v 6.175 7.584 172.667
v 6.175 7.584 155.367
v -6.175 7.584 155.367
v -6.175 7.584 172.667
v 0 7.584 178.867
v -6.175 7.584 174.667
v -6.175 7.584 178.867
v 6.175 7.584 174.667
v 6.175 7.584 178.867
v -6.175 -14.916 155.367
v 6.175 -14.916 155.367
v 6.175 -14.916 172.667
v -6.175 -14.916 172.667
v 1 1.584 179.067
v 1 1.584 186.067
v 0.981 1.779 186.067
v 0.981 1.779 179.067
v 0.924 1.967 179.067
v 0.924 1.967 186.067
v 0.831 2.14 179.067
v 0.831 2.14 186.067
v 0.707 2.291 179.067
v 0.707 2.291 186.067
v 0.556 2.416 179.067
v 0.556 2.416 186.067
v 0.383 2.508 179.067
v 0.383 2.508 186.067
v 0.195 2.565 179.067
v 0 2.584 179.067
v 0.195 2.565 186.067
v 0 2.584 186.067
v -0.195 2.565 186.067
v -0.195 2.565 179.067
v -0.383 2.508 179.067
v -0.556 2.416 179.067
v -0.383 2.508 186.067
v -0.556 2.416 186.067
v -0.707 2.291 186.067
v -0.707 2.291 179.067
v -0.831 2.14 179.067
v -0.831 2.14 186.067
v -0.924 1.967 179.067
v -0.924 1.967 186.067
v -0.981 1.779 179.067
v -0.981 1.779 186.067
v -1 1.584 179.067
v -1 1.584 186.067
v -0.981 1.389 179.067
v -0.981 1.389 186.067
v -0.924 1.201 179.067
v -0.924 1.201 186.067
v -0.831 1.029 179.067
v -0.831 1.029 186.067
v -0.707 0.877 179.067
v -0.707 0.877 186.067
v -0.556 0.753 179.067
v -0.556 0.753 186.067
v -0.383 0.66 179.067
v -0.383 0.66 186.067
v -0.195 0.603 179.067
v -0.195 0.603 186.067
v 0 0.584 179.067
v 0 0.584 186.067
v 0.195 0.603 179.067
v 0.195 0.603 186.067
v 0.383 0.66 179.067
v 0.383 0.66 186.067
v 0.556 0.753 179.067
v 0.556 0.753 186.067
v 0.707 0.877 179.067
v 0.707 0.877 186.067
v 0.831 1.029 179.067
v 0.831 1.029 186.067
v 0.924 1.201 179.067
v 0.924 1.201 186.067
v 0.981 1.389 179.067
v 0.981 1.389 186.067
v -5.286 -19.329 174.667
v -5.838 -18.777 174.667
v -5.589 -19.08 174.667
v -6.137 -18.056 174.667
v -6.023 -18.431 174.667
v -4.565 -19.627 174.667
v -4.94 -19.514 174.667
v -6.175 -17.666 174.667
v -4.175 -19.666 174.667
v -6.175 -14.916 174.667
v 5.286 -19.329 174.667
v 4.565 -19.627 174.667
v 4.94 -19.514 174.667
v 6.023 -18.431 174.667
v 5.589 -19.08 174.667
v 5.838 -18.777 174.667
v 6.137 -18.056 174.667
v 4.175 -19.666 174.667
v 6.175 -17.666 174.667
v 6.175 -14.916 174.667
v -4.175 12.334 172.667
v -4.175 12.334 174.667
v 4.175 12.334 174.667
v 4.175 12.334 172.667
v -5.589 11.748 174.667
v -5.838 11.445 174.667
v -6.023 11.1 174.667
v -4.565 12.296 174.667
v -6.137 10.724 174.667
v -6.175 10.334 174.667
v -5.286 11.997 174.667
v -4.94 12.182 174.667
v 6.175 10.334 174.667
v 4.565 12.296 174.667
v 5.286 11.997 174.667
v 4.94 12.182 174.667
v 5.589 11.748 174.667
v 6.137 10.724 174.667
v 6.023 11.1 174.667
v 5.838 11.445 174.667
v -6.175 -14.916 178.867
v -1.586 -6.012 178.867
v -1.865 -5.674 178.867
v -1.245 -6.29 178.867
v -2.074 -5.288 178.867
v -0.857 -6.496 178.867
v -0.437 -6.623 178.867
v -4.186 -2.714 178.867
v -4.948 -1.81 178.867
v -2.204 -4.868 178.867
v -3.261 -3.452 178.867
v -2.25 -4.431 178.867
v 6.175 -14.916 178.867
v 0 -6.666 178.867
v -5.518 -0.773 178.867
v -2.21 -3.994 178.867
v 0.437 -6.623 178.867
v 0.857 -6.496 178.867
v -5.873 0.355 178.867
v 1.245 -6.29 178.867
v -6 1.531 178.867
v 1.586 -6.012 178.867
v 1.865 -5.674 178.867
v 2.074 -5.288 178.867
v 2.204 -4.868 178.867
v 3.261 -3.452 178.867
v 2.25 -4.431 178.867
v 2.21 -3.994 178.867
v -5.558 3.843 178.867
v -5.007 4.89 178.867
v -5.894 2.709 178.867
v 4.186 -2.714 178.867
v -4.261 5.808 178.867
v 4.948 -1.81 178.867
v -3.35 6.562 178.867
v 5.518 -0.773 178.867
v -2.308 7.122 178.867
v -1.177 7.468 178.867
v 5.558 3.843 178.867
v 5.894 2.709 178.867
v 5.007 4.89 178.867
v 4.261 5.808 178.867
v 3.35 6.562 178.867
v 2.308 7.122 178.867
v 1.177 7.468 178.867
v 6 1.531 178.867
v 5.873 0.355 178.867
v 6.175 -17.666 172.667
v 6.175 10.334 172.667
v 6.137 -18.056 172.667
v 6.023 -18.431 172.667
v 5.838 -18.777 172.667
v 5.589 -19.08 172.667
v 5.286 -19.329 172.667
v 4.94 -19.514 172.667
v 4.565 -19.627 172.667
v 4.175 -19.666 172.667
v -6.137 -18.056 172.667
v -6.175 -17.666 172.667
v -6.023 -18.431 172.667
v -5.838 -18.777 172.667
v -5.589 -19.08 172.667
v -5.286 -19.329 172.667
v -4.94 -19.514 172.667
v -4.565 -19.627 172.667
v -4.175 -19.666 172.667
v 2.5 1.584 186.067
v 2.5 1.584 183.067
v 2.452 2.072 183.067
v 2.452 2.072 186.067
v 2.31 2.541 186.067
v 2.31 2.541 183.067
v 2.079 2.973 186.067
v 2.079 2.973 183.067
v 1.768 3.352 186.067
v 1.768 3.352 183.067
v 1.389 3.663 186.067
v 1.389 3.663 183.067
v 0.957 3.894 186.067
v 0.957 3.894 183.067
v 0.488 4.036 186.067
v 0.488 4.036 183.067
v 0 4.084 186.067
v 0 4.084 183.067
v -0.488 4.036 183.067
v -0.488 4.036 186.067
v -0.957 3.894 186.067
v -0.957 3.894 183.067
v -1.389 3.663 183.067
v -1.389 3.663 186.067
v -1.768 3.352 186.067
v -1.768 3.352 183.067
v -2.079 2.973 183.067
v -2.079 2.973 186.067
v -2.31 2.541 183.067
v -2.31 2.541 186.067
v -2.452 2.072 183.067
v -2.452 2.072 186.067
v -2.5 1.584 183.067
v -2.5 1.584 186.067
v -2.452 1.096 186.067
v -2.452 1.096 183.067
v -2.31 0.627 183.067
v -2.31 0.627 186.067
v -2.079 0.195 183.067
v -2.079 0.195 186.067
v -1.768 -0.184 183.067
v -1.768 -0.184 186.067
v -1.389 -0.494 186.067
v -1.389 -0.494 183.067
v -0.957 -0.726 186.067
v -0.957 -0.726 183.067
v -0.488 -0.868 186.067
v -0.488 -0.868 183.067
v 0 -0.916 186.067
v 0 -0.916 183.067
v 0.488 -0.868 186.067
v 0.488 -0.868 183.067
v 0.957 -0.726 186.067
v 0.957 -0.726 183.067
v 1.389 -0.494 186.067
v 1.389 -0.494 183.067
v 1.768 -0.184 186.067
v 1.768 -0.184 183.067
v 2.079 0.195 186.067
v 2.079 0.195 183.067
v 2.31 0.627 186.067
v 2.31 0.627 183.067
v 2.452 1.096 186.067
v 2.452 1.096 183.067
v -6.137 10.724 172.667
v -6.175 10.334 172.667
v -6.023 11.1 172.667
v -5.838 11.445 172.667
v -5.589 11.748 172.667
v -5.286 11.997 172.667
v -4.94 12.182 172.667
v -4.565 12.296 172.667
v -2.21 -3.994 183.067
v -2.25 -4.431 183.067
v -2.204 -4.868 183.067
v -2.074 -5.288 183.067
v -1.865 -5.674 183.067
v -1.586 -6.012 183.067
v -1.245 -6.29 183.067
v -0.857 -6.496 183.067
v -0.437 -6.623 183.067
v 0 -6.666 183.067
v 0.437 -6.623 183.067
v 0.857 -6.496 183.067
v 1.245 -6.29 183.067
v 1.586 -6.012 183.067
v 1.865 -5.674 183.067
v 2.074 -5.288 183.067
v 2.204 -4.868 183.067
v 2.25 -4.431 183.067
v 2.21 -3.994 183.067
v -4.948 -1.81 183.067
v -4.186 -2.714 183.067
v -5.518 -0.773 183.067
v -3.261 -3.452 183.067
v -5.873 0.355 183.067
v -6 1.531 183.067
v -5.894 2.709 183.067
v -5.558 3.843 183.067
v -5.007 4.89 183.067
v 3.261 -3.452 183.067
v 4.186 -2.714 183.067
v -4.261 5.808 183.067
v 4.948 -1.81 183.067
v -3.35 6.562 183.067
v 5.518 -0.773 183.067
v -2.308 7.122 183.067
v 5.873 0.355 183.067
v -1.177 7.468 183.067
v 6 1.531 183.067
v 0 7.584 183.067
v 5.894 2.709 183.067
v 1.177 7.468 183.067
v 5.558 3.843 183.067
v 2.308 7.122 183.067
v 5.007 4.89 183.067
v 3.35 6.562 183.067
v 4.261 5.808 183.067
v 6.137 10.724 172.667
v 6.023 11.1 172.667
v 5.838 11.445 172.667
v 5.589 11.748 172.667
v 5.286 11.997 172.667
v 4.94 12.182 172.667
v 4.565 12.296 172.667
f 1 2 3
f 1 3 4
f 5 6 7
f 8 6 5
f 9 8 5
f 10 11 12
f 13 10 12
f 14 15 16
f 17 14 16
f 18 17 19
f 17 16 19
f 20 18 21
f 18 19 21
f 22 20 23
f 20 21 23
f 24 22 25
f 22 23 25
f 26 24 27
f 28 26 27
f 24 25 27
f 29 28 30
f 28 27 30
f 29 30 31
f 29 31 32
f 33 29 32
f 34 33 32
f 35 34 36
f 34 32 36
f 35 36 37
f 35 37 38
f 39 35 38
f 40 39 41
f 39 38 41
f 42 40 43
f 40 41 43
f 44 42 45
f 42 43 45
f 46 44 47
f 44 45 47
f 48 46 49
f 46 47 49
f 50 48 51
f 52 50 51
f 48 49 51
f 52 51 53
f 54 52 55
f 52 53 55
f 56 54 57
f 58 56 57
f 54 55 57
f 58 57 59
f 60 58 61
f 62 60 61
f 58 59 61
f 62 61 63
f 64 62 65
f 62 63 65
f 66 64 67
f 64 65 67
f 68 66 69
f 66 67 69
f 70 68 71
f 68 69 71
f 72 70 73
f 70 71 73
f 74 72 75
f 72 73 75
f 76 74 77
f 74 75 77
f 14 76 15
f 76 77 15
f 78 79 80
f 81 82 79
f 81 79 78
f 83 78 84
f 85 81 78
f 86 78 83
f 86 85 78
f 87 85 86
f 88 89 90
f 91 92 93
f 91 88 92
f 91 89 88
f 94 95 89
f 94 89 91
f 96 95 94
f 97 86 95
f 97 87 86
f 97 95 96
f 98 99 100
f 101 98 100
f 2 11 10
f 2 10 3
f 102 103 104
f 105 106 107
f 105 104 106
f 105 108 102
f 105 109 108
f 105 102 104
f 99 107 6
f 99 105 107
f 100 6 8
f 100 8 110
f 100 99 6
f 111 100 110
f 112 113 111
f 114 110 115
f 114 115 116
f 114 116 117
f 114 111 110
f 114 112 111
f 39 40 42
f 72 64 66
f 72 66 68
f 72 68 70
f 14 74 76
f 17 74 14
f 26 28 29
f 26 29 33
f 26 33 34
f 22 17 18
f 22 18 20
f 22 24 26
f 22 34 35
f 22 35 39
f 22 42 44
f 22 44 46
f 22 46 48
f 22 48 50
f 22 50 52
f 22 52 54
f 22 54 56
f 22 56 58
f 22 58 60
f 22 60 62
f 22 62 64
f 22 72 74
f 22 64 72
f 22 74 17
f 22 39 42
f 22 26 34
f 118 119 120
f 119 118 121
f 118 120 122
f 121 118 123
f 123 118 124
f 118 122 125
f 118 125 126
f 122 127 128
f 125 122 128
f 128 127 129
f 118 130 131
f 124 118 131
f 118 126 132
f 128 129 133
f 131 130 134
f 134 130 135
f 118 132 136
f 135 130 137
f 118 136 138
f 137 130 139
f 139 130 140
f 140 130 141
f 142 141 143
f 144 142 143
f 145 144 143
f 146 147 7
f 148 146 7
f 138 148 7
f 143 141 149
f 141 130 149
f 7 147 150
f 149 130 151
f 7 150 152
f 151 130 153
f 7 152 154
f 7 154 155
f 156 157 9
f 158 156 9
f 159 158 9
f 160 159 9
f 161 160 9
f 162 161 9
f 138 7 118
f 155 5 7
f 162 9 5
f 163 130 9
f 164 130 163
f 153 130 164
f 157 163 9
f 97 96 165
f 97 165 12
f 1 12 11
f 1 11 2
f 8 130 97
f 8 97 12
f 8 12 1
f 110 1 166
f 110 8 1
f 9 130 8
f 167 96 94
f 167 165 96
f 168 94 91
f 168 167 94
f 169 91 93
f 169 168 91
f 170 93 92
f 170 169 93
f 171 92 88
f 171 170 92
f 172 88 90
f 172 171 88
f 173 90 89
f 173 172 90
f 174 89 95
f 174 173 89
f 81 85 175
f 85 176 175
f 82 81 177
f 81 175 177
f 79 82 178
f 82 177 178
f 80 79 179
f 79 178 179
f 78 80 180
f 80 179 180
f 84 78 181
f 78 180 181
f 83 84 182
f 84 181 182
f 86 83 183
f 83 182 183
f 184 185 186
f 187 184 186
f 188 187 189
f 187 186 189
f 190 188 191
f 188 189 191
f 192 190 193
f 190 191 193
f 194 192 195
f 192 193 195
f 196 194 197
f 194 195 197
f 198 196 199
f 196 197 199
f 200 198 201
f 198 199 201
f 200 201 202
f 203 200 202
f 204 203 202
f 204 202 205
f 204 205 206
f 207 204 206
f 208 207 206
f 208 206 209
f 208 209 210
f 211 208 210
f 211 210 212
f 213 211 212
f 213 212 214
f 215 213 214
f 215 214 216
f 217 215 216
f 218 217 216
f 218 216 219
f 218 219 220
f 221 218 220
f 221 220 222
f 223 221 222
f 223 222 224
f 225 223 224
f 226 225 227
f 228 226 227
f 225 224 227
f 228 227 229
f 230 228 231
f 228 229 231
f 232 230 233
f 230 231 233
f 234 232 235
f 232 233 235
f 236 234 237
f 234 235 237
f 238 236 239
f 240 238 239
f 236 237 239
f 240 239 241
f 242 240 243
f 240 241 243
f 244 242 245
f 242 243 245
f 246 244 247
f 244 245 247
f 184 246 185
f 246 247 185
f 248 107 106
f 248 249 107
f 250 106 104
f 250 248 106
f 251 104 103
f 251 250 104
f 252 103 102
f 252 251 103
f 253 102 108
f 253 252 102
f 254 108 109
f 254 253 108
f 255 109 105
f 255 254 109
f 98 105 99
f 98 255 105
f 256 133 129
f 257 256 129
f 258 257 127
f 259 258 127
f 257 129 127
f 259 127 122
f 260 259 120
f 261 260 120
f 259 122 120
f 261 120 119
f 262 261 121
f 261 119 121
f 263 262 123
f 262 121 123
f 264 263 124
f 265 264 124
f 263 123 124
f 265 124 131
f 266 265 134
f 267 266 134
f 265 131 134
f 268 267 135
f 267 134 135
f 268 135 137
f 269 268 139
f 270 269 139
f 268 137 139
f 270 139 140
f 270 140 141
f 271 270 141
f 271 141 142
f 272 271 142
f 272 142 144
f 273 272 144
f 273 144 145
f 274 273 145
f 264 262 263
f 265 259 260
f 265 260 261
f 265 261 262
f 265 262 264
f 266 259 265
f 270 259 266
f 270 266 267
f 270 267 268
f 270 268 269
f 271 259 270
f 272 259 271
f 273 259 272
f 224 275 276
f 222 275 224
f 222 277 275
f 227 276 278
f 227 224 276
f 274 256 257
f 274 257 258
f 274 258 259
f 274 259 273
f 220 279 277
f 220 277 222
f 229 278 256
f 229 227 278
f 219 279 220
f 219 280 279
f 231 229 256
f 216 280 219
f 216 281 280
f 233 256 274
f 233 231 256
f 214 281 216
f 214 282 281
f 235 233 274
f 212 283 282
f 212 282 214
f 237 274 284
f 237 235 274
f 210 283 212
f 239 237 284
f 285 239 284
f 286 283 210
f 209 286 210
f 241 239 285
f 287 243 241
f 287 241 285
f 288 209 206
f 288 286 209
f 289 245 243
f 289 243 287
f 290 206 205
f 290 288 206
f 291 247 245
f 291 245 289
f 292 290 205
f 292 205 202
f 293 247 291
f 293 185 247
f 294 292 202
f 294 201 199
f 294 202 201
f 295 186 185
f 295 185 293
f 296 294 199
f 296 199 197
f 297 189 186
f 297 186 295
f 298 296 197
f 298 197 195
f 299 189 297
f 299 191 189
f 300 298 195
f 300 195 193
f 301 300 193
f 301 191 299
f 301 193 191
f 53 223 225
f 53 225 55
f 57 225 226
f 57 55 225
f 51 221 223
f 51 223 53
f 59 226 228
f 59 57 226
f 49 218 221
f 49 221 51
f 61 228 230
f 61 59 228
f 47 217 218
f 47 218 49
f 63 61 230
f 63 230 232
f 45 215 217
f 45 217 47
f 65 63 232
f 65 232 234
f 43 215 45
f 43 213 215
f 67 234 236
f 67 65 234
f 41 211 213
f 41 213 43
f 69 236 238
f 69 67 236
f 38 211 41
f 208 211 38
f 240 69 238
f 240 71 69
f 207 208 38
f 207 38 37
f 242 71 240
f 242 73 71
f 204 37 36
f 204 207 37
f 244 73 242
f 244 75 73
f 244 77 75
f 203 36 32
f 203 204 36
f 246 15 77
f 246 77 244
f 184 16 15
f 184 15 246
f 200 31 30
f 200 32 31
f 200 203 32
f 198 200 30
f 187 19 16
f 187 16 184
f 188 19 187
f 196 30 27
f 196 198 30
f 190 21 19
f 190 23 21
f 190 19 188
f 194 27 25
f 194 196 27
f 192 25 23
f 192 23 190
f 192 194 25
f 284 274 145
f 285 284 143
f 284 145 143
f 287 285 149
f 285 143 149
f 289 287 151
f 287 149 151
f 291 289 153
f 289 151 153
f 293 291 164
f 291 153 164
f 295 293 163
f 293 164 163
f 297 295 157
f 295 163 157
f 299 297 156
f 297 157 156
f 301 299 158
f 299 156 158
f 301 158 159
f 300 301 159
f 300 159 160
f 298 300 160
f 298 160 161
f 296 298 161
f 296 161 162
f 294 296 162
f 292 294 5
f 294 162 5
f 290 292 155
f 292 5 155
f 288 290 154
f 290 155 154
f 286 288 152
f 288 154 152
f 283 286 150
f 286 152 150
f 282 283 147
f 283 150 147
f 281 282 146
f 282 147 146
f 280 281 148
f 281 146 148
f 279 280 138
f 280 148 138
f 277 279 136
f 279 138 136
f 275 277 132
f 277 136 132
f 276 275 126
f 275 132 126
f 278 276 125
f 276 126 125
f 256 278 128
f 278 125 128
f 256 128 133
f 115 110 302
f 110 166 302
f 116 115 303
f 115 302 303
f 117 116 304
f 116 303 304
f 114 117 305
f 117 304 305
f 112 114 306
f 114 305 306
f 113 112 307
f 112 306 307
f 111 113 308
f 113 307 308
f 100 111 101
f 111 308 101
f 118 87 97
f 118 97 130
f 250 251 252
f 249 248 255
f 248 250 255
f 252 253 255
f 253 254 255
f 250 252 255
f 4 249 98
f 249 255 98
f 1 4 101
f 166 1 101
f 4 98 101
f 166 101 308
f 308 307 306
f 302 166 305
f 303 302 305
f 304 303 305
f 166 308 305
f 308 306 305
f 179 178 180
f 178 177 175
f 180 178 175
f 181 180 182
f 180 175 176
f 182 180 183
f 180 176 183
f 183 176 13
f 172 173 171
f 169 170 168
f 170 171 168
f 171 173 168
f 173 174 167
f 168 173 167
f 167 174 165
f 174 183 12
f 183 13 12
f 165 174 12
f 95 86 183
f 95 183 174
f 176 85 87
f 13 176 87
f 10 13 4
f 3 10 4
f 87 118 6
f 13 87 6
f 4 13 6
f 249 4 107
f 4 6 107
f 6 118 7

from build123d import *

# Parameters (mm, degrees)
SKETCH3_W           = 22.5
SKETCH3_H           = 23.5
BOSS_EXTRUDE1_DEPTH = 6.175
SKETCH4_W           = 12.35
SKETCH4_H           = 32
BOSS_EXTRUDE2_DEPTH = 2
BOSS_EXTRUDE3_DEPTH = 4.2
SKETCH6_R           = 2.5
CUT_EXTRUDE1_DEPTH  = 4.2
FILLET1_R           = 2
SKETCH7_R           = 2.5
BOSS_EXTRUDE4_DEPTH = 7.2
SKETCH8_R           = 1
CUT_EXTRUDE2_DEPTH  = 7


with BuildPart() as part:
    # Sketch3 → Boss-Extrude1 (new body, symmetric)
    with BuildSketch(Plane(origin=(0, -28.275548605, 0), x_dir=(0, 1, 0), z_dir=(1, 0, 0))):
        with Locations((24.609729517, 167.116706922)):
            Rectangle(SKETCH3_W, SKETCH3_H)
    extrude(amount=BOSS_EXTRUDE1_DEPTH, both=True)

    # Sketch4 → Boss-Extrude2 (add)
    with BuildSketch(Plane.XY.offset(174.666706922)):
        with Locations((0, -3.665819089)):
            Rectangle(SKETCH4_W, SKETCH4_H)
    extrude(amount=-BOSS_EXTRUDE2_DEPTH)

    # Sketch5 → Boss-Extrude3 (add)
    with BuildSketch(Plane.XY.offset(178.866706922)):
        with BuildLine():
            ThreePointArc((2.210095356, -3.993944089), (0, 7.584180911), (-2.210095356, -3.993944089))
            ThreePointArc((-2.210095356, -3.993944089), (0, -6.665819089), (2.210095356, -3.993944089))
        make_face()
    extrude(amount=BOSS_EXTRUDE3_DEPTH)

    # Sketch6 → Cut-Extrude1 (cut)
    with BuildSketch(Plane.XY.offset(183.066706922)):
        with Locations((0, 1.584180911)):
            Circle(SKETCH6_R)
    extrude(amount=-CUT_EXTRUDE1_DEPTH, mode=Mode.SUBTRACT)

    # Fillet1
    fillet1_edges = [part.edges().sort_by_distance(p)[0] for p in [
        (-6.175, -19.665819089, 173.666706922),
        (6.175, 12.334180911, 173.666706922),
        (-6.175, 12.334180911, 173.666706922),
        (6.175, -19.665819089, 173.666706922),
    ]]
    fillet(fillet1_edges, radius=FILLET1_R)

    # Sketch7 → Boss-Extrude4 (add)
    with BuildSketch(Plane.XY.offset(178.866706922)):
        with Locations((0, 1.584180911)):
            Circle(SKETCH7_R)
    extrude(amount=BOSS_EXTRUDE4_DEPTH)

    # Sketch8 → Cut-Extrude2 (cut)
    with BuildSketch(Plane.XY.offset(186.066706922)):
        with Locations((0, 1.584180911)):
            Circle(SKETCH8_R)
    extrude(amount=-CUT_EXTRUDE2_DEPTH, mode=Mode.SUBTRACT)


solid = part.part
